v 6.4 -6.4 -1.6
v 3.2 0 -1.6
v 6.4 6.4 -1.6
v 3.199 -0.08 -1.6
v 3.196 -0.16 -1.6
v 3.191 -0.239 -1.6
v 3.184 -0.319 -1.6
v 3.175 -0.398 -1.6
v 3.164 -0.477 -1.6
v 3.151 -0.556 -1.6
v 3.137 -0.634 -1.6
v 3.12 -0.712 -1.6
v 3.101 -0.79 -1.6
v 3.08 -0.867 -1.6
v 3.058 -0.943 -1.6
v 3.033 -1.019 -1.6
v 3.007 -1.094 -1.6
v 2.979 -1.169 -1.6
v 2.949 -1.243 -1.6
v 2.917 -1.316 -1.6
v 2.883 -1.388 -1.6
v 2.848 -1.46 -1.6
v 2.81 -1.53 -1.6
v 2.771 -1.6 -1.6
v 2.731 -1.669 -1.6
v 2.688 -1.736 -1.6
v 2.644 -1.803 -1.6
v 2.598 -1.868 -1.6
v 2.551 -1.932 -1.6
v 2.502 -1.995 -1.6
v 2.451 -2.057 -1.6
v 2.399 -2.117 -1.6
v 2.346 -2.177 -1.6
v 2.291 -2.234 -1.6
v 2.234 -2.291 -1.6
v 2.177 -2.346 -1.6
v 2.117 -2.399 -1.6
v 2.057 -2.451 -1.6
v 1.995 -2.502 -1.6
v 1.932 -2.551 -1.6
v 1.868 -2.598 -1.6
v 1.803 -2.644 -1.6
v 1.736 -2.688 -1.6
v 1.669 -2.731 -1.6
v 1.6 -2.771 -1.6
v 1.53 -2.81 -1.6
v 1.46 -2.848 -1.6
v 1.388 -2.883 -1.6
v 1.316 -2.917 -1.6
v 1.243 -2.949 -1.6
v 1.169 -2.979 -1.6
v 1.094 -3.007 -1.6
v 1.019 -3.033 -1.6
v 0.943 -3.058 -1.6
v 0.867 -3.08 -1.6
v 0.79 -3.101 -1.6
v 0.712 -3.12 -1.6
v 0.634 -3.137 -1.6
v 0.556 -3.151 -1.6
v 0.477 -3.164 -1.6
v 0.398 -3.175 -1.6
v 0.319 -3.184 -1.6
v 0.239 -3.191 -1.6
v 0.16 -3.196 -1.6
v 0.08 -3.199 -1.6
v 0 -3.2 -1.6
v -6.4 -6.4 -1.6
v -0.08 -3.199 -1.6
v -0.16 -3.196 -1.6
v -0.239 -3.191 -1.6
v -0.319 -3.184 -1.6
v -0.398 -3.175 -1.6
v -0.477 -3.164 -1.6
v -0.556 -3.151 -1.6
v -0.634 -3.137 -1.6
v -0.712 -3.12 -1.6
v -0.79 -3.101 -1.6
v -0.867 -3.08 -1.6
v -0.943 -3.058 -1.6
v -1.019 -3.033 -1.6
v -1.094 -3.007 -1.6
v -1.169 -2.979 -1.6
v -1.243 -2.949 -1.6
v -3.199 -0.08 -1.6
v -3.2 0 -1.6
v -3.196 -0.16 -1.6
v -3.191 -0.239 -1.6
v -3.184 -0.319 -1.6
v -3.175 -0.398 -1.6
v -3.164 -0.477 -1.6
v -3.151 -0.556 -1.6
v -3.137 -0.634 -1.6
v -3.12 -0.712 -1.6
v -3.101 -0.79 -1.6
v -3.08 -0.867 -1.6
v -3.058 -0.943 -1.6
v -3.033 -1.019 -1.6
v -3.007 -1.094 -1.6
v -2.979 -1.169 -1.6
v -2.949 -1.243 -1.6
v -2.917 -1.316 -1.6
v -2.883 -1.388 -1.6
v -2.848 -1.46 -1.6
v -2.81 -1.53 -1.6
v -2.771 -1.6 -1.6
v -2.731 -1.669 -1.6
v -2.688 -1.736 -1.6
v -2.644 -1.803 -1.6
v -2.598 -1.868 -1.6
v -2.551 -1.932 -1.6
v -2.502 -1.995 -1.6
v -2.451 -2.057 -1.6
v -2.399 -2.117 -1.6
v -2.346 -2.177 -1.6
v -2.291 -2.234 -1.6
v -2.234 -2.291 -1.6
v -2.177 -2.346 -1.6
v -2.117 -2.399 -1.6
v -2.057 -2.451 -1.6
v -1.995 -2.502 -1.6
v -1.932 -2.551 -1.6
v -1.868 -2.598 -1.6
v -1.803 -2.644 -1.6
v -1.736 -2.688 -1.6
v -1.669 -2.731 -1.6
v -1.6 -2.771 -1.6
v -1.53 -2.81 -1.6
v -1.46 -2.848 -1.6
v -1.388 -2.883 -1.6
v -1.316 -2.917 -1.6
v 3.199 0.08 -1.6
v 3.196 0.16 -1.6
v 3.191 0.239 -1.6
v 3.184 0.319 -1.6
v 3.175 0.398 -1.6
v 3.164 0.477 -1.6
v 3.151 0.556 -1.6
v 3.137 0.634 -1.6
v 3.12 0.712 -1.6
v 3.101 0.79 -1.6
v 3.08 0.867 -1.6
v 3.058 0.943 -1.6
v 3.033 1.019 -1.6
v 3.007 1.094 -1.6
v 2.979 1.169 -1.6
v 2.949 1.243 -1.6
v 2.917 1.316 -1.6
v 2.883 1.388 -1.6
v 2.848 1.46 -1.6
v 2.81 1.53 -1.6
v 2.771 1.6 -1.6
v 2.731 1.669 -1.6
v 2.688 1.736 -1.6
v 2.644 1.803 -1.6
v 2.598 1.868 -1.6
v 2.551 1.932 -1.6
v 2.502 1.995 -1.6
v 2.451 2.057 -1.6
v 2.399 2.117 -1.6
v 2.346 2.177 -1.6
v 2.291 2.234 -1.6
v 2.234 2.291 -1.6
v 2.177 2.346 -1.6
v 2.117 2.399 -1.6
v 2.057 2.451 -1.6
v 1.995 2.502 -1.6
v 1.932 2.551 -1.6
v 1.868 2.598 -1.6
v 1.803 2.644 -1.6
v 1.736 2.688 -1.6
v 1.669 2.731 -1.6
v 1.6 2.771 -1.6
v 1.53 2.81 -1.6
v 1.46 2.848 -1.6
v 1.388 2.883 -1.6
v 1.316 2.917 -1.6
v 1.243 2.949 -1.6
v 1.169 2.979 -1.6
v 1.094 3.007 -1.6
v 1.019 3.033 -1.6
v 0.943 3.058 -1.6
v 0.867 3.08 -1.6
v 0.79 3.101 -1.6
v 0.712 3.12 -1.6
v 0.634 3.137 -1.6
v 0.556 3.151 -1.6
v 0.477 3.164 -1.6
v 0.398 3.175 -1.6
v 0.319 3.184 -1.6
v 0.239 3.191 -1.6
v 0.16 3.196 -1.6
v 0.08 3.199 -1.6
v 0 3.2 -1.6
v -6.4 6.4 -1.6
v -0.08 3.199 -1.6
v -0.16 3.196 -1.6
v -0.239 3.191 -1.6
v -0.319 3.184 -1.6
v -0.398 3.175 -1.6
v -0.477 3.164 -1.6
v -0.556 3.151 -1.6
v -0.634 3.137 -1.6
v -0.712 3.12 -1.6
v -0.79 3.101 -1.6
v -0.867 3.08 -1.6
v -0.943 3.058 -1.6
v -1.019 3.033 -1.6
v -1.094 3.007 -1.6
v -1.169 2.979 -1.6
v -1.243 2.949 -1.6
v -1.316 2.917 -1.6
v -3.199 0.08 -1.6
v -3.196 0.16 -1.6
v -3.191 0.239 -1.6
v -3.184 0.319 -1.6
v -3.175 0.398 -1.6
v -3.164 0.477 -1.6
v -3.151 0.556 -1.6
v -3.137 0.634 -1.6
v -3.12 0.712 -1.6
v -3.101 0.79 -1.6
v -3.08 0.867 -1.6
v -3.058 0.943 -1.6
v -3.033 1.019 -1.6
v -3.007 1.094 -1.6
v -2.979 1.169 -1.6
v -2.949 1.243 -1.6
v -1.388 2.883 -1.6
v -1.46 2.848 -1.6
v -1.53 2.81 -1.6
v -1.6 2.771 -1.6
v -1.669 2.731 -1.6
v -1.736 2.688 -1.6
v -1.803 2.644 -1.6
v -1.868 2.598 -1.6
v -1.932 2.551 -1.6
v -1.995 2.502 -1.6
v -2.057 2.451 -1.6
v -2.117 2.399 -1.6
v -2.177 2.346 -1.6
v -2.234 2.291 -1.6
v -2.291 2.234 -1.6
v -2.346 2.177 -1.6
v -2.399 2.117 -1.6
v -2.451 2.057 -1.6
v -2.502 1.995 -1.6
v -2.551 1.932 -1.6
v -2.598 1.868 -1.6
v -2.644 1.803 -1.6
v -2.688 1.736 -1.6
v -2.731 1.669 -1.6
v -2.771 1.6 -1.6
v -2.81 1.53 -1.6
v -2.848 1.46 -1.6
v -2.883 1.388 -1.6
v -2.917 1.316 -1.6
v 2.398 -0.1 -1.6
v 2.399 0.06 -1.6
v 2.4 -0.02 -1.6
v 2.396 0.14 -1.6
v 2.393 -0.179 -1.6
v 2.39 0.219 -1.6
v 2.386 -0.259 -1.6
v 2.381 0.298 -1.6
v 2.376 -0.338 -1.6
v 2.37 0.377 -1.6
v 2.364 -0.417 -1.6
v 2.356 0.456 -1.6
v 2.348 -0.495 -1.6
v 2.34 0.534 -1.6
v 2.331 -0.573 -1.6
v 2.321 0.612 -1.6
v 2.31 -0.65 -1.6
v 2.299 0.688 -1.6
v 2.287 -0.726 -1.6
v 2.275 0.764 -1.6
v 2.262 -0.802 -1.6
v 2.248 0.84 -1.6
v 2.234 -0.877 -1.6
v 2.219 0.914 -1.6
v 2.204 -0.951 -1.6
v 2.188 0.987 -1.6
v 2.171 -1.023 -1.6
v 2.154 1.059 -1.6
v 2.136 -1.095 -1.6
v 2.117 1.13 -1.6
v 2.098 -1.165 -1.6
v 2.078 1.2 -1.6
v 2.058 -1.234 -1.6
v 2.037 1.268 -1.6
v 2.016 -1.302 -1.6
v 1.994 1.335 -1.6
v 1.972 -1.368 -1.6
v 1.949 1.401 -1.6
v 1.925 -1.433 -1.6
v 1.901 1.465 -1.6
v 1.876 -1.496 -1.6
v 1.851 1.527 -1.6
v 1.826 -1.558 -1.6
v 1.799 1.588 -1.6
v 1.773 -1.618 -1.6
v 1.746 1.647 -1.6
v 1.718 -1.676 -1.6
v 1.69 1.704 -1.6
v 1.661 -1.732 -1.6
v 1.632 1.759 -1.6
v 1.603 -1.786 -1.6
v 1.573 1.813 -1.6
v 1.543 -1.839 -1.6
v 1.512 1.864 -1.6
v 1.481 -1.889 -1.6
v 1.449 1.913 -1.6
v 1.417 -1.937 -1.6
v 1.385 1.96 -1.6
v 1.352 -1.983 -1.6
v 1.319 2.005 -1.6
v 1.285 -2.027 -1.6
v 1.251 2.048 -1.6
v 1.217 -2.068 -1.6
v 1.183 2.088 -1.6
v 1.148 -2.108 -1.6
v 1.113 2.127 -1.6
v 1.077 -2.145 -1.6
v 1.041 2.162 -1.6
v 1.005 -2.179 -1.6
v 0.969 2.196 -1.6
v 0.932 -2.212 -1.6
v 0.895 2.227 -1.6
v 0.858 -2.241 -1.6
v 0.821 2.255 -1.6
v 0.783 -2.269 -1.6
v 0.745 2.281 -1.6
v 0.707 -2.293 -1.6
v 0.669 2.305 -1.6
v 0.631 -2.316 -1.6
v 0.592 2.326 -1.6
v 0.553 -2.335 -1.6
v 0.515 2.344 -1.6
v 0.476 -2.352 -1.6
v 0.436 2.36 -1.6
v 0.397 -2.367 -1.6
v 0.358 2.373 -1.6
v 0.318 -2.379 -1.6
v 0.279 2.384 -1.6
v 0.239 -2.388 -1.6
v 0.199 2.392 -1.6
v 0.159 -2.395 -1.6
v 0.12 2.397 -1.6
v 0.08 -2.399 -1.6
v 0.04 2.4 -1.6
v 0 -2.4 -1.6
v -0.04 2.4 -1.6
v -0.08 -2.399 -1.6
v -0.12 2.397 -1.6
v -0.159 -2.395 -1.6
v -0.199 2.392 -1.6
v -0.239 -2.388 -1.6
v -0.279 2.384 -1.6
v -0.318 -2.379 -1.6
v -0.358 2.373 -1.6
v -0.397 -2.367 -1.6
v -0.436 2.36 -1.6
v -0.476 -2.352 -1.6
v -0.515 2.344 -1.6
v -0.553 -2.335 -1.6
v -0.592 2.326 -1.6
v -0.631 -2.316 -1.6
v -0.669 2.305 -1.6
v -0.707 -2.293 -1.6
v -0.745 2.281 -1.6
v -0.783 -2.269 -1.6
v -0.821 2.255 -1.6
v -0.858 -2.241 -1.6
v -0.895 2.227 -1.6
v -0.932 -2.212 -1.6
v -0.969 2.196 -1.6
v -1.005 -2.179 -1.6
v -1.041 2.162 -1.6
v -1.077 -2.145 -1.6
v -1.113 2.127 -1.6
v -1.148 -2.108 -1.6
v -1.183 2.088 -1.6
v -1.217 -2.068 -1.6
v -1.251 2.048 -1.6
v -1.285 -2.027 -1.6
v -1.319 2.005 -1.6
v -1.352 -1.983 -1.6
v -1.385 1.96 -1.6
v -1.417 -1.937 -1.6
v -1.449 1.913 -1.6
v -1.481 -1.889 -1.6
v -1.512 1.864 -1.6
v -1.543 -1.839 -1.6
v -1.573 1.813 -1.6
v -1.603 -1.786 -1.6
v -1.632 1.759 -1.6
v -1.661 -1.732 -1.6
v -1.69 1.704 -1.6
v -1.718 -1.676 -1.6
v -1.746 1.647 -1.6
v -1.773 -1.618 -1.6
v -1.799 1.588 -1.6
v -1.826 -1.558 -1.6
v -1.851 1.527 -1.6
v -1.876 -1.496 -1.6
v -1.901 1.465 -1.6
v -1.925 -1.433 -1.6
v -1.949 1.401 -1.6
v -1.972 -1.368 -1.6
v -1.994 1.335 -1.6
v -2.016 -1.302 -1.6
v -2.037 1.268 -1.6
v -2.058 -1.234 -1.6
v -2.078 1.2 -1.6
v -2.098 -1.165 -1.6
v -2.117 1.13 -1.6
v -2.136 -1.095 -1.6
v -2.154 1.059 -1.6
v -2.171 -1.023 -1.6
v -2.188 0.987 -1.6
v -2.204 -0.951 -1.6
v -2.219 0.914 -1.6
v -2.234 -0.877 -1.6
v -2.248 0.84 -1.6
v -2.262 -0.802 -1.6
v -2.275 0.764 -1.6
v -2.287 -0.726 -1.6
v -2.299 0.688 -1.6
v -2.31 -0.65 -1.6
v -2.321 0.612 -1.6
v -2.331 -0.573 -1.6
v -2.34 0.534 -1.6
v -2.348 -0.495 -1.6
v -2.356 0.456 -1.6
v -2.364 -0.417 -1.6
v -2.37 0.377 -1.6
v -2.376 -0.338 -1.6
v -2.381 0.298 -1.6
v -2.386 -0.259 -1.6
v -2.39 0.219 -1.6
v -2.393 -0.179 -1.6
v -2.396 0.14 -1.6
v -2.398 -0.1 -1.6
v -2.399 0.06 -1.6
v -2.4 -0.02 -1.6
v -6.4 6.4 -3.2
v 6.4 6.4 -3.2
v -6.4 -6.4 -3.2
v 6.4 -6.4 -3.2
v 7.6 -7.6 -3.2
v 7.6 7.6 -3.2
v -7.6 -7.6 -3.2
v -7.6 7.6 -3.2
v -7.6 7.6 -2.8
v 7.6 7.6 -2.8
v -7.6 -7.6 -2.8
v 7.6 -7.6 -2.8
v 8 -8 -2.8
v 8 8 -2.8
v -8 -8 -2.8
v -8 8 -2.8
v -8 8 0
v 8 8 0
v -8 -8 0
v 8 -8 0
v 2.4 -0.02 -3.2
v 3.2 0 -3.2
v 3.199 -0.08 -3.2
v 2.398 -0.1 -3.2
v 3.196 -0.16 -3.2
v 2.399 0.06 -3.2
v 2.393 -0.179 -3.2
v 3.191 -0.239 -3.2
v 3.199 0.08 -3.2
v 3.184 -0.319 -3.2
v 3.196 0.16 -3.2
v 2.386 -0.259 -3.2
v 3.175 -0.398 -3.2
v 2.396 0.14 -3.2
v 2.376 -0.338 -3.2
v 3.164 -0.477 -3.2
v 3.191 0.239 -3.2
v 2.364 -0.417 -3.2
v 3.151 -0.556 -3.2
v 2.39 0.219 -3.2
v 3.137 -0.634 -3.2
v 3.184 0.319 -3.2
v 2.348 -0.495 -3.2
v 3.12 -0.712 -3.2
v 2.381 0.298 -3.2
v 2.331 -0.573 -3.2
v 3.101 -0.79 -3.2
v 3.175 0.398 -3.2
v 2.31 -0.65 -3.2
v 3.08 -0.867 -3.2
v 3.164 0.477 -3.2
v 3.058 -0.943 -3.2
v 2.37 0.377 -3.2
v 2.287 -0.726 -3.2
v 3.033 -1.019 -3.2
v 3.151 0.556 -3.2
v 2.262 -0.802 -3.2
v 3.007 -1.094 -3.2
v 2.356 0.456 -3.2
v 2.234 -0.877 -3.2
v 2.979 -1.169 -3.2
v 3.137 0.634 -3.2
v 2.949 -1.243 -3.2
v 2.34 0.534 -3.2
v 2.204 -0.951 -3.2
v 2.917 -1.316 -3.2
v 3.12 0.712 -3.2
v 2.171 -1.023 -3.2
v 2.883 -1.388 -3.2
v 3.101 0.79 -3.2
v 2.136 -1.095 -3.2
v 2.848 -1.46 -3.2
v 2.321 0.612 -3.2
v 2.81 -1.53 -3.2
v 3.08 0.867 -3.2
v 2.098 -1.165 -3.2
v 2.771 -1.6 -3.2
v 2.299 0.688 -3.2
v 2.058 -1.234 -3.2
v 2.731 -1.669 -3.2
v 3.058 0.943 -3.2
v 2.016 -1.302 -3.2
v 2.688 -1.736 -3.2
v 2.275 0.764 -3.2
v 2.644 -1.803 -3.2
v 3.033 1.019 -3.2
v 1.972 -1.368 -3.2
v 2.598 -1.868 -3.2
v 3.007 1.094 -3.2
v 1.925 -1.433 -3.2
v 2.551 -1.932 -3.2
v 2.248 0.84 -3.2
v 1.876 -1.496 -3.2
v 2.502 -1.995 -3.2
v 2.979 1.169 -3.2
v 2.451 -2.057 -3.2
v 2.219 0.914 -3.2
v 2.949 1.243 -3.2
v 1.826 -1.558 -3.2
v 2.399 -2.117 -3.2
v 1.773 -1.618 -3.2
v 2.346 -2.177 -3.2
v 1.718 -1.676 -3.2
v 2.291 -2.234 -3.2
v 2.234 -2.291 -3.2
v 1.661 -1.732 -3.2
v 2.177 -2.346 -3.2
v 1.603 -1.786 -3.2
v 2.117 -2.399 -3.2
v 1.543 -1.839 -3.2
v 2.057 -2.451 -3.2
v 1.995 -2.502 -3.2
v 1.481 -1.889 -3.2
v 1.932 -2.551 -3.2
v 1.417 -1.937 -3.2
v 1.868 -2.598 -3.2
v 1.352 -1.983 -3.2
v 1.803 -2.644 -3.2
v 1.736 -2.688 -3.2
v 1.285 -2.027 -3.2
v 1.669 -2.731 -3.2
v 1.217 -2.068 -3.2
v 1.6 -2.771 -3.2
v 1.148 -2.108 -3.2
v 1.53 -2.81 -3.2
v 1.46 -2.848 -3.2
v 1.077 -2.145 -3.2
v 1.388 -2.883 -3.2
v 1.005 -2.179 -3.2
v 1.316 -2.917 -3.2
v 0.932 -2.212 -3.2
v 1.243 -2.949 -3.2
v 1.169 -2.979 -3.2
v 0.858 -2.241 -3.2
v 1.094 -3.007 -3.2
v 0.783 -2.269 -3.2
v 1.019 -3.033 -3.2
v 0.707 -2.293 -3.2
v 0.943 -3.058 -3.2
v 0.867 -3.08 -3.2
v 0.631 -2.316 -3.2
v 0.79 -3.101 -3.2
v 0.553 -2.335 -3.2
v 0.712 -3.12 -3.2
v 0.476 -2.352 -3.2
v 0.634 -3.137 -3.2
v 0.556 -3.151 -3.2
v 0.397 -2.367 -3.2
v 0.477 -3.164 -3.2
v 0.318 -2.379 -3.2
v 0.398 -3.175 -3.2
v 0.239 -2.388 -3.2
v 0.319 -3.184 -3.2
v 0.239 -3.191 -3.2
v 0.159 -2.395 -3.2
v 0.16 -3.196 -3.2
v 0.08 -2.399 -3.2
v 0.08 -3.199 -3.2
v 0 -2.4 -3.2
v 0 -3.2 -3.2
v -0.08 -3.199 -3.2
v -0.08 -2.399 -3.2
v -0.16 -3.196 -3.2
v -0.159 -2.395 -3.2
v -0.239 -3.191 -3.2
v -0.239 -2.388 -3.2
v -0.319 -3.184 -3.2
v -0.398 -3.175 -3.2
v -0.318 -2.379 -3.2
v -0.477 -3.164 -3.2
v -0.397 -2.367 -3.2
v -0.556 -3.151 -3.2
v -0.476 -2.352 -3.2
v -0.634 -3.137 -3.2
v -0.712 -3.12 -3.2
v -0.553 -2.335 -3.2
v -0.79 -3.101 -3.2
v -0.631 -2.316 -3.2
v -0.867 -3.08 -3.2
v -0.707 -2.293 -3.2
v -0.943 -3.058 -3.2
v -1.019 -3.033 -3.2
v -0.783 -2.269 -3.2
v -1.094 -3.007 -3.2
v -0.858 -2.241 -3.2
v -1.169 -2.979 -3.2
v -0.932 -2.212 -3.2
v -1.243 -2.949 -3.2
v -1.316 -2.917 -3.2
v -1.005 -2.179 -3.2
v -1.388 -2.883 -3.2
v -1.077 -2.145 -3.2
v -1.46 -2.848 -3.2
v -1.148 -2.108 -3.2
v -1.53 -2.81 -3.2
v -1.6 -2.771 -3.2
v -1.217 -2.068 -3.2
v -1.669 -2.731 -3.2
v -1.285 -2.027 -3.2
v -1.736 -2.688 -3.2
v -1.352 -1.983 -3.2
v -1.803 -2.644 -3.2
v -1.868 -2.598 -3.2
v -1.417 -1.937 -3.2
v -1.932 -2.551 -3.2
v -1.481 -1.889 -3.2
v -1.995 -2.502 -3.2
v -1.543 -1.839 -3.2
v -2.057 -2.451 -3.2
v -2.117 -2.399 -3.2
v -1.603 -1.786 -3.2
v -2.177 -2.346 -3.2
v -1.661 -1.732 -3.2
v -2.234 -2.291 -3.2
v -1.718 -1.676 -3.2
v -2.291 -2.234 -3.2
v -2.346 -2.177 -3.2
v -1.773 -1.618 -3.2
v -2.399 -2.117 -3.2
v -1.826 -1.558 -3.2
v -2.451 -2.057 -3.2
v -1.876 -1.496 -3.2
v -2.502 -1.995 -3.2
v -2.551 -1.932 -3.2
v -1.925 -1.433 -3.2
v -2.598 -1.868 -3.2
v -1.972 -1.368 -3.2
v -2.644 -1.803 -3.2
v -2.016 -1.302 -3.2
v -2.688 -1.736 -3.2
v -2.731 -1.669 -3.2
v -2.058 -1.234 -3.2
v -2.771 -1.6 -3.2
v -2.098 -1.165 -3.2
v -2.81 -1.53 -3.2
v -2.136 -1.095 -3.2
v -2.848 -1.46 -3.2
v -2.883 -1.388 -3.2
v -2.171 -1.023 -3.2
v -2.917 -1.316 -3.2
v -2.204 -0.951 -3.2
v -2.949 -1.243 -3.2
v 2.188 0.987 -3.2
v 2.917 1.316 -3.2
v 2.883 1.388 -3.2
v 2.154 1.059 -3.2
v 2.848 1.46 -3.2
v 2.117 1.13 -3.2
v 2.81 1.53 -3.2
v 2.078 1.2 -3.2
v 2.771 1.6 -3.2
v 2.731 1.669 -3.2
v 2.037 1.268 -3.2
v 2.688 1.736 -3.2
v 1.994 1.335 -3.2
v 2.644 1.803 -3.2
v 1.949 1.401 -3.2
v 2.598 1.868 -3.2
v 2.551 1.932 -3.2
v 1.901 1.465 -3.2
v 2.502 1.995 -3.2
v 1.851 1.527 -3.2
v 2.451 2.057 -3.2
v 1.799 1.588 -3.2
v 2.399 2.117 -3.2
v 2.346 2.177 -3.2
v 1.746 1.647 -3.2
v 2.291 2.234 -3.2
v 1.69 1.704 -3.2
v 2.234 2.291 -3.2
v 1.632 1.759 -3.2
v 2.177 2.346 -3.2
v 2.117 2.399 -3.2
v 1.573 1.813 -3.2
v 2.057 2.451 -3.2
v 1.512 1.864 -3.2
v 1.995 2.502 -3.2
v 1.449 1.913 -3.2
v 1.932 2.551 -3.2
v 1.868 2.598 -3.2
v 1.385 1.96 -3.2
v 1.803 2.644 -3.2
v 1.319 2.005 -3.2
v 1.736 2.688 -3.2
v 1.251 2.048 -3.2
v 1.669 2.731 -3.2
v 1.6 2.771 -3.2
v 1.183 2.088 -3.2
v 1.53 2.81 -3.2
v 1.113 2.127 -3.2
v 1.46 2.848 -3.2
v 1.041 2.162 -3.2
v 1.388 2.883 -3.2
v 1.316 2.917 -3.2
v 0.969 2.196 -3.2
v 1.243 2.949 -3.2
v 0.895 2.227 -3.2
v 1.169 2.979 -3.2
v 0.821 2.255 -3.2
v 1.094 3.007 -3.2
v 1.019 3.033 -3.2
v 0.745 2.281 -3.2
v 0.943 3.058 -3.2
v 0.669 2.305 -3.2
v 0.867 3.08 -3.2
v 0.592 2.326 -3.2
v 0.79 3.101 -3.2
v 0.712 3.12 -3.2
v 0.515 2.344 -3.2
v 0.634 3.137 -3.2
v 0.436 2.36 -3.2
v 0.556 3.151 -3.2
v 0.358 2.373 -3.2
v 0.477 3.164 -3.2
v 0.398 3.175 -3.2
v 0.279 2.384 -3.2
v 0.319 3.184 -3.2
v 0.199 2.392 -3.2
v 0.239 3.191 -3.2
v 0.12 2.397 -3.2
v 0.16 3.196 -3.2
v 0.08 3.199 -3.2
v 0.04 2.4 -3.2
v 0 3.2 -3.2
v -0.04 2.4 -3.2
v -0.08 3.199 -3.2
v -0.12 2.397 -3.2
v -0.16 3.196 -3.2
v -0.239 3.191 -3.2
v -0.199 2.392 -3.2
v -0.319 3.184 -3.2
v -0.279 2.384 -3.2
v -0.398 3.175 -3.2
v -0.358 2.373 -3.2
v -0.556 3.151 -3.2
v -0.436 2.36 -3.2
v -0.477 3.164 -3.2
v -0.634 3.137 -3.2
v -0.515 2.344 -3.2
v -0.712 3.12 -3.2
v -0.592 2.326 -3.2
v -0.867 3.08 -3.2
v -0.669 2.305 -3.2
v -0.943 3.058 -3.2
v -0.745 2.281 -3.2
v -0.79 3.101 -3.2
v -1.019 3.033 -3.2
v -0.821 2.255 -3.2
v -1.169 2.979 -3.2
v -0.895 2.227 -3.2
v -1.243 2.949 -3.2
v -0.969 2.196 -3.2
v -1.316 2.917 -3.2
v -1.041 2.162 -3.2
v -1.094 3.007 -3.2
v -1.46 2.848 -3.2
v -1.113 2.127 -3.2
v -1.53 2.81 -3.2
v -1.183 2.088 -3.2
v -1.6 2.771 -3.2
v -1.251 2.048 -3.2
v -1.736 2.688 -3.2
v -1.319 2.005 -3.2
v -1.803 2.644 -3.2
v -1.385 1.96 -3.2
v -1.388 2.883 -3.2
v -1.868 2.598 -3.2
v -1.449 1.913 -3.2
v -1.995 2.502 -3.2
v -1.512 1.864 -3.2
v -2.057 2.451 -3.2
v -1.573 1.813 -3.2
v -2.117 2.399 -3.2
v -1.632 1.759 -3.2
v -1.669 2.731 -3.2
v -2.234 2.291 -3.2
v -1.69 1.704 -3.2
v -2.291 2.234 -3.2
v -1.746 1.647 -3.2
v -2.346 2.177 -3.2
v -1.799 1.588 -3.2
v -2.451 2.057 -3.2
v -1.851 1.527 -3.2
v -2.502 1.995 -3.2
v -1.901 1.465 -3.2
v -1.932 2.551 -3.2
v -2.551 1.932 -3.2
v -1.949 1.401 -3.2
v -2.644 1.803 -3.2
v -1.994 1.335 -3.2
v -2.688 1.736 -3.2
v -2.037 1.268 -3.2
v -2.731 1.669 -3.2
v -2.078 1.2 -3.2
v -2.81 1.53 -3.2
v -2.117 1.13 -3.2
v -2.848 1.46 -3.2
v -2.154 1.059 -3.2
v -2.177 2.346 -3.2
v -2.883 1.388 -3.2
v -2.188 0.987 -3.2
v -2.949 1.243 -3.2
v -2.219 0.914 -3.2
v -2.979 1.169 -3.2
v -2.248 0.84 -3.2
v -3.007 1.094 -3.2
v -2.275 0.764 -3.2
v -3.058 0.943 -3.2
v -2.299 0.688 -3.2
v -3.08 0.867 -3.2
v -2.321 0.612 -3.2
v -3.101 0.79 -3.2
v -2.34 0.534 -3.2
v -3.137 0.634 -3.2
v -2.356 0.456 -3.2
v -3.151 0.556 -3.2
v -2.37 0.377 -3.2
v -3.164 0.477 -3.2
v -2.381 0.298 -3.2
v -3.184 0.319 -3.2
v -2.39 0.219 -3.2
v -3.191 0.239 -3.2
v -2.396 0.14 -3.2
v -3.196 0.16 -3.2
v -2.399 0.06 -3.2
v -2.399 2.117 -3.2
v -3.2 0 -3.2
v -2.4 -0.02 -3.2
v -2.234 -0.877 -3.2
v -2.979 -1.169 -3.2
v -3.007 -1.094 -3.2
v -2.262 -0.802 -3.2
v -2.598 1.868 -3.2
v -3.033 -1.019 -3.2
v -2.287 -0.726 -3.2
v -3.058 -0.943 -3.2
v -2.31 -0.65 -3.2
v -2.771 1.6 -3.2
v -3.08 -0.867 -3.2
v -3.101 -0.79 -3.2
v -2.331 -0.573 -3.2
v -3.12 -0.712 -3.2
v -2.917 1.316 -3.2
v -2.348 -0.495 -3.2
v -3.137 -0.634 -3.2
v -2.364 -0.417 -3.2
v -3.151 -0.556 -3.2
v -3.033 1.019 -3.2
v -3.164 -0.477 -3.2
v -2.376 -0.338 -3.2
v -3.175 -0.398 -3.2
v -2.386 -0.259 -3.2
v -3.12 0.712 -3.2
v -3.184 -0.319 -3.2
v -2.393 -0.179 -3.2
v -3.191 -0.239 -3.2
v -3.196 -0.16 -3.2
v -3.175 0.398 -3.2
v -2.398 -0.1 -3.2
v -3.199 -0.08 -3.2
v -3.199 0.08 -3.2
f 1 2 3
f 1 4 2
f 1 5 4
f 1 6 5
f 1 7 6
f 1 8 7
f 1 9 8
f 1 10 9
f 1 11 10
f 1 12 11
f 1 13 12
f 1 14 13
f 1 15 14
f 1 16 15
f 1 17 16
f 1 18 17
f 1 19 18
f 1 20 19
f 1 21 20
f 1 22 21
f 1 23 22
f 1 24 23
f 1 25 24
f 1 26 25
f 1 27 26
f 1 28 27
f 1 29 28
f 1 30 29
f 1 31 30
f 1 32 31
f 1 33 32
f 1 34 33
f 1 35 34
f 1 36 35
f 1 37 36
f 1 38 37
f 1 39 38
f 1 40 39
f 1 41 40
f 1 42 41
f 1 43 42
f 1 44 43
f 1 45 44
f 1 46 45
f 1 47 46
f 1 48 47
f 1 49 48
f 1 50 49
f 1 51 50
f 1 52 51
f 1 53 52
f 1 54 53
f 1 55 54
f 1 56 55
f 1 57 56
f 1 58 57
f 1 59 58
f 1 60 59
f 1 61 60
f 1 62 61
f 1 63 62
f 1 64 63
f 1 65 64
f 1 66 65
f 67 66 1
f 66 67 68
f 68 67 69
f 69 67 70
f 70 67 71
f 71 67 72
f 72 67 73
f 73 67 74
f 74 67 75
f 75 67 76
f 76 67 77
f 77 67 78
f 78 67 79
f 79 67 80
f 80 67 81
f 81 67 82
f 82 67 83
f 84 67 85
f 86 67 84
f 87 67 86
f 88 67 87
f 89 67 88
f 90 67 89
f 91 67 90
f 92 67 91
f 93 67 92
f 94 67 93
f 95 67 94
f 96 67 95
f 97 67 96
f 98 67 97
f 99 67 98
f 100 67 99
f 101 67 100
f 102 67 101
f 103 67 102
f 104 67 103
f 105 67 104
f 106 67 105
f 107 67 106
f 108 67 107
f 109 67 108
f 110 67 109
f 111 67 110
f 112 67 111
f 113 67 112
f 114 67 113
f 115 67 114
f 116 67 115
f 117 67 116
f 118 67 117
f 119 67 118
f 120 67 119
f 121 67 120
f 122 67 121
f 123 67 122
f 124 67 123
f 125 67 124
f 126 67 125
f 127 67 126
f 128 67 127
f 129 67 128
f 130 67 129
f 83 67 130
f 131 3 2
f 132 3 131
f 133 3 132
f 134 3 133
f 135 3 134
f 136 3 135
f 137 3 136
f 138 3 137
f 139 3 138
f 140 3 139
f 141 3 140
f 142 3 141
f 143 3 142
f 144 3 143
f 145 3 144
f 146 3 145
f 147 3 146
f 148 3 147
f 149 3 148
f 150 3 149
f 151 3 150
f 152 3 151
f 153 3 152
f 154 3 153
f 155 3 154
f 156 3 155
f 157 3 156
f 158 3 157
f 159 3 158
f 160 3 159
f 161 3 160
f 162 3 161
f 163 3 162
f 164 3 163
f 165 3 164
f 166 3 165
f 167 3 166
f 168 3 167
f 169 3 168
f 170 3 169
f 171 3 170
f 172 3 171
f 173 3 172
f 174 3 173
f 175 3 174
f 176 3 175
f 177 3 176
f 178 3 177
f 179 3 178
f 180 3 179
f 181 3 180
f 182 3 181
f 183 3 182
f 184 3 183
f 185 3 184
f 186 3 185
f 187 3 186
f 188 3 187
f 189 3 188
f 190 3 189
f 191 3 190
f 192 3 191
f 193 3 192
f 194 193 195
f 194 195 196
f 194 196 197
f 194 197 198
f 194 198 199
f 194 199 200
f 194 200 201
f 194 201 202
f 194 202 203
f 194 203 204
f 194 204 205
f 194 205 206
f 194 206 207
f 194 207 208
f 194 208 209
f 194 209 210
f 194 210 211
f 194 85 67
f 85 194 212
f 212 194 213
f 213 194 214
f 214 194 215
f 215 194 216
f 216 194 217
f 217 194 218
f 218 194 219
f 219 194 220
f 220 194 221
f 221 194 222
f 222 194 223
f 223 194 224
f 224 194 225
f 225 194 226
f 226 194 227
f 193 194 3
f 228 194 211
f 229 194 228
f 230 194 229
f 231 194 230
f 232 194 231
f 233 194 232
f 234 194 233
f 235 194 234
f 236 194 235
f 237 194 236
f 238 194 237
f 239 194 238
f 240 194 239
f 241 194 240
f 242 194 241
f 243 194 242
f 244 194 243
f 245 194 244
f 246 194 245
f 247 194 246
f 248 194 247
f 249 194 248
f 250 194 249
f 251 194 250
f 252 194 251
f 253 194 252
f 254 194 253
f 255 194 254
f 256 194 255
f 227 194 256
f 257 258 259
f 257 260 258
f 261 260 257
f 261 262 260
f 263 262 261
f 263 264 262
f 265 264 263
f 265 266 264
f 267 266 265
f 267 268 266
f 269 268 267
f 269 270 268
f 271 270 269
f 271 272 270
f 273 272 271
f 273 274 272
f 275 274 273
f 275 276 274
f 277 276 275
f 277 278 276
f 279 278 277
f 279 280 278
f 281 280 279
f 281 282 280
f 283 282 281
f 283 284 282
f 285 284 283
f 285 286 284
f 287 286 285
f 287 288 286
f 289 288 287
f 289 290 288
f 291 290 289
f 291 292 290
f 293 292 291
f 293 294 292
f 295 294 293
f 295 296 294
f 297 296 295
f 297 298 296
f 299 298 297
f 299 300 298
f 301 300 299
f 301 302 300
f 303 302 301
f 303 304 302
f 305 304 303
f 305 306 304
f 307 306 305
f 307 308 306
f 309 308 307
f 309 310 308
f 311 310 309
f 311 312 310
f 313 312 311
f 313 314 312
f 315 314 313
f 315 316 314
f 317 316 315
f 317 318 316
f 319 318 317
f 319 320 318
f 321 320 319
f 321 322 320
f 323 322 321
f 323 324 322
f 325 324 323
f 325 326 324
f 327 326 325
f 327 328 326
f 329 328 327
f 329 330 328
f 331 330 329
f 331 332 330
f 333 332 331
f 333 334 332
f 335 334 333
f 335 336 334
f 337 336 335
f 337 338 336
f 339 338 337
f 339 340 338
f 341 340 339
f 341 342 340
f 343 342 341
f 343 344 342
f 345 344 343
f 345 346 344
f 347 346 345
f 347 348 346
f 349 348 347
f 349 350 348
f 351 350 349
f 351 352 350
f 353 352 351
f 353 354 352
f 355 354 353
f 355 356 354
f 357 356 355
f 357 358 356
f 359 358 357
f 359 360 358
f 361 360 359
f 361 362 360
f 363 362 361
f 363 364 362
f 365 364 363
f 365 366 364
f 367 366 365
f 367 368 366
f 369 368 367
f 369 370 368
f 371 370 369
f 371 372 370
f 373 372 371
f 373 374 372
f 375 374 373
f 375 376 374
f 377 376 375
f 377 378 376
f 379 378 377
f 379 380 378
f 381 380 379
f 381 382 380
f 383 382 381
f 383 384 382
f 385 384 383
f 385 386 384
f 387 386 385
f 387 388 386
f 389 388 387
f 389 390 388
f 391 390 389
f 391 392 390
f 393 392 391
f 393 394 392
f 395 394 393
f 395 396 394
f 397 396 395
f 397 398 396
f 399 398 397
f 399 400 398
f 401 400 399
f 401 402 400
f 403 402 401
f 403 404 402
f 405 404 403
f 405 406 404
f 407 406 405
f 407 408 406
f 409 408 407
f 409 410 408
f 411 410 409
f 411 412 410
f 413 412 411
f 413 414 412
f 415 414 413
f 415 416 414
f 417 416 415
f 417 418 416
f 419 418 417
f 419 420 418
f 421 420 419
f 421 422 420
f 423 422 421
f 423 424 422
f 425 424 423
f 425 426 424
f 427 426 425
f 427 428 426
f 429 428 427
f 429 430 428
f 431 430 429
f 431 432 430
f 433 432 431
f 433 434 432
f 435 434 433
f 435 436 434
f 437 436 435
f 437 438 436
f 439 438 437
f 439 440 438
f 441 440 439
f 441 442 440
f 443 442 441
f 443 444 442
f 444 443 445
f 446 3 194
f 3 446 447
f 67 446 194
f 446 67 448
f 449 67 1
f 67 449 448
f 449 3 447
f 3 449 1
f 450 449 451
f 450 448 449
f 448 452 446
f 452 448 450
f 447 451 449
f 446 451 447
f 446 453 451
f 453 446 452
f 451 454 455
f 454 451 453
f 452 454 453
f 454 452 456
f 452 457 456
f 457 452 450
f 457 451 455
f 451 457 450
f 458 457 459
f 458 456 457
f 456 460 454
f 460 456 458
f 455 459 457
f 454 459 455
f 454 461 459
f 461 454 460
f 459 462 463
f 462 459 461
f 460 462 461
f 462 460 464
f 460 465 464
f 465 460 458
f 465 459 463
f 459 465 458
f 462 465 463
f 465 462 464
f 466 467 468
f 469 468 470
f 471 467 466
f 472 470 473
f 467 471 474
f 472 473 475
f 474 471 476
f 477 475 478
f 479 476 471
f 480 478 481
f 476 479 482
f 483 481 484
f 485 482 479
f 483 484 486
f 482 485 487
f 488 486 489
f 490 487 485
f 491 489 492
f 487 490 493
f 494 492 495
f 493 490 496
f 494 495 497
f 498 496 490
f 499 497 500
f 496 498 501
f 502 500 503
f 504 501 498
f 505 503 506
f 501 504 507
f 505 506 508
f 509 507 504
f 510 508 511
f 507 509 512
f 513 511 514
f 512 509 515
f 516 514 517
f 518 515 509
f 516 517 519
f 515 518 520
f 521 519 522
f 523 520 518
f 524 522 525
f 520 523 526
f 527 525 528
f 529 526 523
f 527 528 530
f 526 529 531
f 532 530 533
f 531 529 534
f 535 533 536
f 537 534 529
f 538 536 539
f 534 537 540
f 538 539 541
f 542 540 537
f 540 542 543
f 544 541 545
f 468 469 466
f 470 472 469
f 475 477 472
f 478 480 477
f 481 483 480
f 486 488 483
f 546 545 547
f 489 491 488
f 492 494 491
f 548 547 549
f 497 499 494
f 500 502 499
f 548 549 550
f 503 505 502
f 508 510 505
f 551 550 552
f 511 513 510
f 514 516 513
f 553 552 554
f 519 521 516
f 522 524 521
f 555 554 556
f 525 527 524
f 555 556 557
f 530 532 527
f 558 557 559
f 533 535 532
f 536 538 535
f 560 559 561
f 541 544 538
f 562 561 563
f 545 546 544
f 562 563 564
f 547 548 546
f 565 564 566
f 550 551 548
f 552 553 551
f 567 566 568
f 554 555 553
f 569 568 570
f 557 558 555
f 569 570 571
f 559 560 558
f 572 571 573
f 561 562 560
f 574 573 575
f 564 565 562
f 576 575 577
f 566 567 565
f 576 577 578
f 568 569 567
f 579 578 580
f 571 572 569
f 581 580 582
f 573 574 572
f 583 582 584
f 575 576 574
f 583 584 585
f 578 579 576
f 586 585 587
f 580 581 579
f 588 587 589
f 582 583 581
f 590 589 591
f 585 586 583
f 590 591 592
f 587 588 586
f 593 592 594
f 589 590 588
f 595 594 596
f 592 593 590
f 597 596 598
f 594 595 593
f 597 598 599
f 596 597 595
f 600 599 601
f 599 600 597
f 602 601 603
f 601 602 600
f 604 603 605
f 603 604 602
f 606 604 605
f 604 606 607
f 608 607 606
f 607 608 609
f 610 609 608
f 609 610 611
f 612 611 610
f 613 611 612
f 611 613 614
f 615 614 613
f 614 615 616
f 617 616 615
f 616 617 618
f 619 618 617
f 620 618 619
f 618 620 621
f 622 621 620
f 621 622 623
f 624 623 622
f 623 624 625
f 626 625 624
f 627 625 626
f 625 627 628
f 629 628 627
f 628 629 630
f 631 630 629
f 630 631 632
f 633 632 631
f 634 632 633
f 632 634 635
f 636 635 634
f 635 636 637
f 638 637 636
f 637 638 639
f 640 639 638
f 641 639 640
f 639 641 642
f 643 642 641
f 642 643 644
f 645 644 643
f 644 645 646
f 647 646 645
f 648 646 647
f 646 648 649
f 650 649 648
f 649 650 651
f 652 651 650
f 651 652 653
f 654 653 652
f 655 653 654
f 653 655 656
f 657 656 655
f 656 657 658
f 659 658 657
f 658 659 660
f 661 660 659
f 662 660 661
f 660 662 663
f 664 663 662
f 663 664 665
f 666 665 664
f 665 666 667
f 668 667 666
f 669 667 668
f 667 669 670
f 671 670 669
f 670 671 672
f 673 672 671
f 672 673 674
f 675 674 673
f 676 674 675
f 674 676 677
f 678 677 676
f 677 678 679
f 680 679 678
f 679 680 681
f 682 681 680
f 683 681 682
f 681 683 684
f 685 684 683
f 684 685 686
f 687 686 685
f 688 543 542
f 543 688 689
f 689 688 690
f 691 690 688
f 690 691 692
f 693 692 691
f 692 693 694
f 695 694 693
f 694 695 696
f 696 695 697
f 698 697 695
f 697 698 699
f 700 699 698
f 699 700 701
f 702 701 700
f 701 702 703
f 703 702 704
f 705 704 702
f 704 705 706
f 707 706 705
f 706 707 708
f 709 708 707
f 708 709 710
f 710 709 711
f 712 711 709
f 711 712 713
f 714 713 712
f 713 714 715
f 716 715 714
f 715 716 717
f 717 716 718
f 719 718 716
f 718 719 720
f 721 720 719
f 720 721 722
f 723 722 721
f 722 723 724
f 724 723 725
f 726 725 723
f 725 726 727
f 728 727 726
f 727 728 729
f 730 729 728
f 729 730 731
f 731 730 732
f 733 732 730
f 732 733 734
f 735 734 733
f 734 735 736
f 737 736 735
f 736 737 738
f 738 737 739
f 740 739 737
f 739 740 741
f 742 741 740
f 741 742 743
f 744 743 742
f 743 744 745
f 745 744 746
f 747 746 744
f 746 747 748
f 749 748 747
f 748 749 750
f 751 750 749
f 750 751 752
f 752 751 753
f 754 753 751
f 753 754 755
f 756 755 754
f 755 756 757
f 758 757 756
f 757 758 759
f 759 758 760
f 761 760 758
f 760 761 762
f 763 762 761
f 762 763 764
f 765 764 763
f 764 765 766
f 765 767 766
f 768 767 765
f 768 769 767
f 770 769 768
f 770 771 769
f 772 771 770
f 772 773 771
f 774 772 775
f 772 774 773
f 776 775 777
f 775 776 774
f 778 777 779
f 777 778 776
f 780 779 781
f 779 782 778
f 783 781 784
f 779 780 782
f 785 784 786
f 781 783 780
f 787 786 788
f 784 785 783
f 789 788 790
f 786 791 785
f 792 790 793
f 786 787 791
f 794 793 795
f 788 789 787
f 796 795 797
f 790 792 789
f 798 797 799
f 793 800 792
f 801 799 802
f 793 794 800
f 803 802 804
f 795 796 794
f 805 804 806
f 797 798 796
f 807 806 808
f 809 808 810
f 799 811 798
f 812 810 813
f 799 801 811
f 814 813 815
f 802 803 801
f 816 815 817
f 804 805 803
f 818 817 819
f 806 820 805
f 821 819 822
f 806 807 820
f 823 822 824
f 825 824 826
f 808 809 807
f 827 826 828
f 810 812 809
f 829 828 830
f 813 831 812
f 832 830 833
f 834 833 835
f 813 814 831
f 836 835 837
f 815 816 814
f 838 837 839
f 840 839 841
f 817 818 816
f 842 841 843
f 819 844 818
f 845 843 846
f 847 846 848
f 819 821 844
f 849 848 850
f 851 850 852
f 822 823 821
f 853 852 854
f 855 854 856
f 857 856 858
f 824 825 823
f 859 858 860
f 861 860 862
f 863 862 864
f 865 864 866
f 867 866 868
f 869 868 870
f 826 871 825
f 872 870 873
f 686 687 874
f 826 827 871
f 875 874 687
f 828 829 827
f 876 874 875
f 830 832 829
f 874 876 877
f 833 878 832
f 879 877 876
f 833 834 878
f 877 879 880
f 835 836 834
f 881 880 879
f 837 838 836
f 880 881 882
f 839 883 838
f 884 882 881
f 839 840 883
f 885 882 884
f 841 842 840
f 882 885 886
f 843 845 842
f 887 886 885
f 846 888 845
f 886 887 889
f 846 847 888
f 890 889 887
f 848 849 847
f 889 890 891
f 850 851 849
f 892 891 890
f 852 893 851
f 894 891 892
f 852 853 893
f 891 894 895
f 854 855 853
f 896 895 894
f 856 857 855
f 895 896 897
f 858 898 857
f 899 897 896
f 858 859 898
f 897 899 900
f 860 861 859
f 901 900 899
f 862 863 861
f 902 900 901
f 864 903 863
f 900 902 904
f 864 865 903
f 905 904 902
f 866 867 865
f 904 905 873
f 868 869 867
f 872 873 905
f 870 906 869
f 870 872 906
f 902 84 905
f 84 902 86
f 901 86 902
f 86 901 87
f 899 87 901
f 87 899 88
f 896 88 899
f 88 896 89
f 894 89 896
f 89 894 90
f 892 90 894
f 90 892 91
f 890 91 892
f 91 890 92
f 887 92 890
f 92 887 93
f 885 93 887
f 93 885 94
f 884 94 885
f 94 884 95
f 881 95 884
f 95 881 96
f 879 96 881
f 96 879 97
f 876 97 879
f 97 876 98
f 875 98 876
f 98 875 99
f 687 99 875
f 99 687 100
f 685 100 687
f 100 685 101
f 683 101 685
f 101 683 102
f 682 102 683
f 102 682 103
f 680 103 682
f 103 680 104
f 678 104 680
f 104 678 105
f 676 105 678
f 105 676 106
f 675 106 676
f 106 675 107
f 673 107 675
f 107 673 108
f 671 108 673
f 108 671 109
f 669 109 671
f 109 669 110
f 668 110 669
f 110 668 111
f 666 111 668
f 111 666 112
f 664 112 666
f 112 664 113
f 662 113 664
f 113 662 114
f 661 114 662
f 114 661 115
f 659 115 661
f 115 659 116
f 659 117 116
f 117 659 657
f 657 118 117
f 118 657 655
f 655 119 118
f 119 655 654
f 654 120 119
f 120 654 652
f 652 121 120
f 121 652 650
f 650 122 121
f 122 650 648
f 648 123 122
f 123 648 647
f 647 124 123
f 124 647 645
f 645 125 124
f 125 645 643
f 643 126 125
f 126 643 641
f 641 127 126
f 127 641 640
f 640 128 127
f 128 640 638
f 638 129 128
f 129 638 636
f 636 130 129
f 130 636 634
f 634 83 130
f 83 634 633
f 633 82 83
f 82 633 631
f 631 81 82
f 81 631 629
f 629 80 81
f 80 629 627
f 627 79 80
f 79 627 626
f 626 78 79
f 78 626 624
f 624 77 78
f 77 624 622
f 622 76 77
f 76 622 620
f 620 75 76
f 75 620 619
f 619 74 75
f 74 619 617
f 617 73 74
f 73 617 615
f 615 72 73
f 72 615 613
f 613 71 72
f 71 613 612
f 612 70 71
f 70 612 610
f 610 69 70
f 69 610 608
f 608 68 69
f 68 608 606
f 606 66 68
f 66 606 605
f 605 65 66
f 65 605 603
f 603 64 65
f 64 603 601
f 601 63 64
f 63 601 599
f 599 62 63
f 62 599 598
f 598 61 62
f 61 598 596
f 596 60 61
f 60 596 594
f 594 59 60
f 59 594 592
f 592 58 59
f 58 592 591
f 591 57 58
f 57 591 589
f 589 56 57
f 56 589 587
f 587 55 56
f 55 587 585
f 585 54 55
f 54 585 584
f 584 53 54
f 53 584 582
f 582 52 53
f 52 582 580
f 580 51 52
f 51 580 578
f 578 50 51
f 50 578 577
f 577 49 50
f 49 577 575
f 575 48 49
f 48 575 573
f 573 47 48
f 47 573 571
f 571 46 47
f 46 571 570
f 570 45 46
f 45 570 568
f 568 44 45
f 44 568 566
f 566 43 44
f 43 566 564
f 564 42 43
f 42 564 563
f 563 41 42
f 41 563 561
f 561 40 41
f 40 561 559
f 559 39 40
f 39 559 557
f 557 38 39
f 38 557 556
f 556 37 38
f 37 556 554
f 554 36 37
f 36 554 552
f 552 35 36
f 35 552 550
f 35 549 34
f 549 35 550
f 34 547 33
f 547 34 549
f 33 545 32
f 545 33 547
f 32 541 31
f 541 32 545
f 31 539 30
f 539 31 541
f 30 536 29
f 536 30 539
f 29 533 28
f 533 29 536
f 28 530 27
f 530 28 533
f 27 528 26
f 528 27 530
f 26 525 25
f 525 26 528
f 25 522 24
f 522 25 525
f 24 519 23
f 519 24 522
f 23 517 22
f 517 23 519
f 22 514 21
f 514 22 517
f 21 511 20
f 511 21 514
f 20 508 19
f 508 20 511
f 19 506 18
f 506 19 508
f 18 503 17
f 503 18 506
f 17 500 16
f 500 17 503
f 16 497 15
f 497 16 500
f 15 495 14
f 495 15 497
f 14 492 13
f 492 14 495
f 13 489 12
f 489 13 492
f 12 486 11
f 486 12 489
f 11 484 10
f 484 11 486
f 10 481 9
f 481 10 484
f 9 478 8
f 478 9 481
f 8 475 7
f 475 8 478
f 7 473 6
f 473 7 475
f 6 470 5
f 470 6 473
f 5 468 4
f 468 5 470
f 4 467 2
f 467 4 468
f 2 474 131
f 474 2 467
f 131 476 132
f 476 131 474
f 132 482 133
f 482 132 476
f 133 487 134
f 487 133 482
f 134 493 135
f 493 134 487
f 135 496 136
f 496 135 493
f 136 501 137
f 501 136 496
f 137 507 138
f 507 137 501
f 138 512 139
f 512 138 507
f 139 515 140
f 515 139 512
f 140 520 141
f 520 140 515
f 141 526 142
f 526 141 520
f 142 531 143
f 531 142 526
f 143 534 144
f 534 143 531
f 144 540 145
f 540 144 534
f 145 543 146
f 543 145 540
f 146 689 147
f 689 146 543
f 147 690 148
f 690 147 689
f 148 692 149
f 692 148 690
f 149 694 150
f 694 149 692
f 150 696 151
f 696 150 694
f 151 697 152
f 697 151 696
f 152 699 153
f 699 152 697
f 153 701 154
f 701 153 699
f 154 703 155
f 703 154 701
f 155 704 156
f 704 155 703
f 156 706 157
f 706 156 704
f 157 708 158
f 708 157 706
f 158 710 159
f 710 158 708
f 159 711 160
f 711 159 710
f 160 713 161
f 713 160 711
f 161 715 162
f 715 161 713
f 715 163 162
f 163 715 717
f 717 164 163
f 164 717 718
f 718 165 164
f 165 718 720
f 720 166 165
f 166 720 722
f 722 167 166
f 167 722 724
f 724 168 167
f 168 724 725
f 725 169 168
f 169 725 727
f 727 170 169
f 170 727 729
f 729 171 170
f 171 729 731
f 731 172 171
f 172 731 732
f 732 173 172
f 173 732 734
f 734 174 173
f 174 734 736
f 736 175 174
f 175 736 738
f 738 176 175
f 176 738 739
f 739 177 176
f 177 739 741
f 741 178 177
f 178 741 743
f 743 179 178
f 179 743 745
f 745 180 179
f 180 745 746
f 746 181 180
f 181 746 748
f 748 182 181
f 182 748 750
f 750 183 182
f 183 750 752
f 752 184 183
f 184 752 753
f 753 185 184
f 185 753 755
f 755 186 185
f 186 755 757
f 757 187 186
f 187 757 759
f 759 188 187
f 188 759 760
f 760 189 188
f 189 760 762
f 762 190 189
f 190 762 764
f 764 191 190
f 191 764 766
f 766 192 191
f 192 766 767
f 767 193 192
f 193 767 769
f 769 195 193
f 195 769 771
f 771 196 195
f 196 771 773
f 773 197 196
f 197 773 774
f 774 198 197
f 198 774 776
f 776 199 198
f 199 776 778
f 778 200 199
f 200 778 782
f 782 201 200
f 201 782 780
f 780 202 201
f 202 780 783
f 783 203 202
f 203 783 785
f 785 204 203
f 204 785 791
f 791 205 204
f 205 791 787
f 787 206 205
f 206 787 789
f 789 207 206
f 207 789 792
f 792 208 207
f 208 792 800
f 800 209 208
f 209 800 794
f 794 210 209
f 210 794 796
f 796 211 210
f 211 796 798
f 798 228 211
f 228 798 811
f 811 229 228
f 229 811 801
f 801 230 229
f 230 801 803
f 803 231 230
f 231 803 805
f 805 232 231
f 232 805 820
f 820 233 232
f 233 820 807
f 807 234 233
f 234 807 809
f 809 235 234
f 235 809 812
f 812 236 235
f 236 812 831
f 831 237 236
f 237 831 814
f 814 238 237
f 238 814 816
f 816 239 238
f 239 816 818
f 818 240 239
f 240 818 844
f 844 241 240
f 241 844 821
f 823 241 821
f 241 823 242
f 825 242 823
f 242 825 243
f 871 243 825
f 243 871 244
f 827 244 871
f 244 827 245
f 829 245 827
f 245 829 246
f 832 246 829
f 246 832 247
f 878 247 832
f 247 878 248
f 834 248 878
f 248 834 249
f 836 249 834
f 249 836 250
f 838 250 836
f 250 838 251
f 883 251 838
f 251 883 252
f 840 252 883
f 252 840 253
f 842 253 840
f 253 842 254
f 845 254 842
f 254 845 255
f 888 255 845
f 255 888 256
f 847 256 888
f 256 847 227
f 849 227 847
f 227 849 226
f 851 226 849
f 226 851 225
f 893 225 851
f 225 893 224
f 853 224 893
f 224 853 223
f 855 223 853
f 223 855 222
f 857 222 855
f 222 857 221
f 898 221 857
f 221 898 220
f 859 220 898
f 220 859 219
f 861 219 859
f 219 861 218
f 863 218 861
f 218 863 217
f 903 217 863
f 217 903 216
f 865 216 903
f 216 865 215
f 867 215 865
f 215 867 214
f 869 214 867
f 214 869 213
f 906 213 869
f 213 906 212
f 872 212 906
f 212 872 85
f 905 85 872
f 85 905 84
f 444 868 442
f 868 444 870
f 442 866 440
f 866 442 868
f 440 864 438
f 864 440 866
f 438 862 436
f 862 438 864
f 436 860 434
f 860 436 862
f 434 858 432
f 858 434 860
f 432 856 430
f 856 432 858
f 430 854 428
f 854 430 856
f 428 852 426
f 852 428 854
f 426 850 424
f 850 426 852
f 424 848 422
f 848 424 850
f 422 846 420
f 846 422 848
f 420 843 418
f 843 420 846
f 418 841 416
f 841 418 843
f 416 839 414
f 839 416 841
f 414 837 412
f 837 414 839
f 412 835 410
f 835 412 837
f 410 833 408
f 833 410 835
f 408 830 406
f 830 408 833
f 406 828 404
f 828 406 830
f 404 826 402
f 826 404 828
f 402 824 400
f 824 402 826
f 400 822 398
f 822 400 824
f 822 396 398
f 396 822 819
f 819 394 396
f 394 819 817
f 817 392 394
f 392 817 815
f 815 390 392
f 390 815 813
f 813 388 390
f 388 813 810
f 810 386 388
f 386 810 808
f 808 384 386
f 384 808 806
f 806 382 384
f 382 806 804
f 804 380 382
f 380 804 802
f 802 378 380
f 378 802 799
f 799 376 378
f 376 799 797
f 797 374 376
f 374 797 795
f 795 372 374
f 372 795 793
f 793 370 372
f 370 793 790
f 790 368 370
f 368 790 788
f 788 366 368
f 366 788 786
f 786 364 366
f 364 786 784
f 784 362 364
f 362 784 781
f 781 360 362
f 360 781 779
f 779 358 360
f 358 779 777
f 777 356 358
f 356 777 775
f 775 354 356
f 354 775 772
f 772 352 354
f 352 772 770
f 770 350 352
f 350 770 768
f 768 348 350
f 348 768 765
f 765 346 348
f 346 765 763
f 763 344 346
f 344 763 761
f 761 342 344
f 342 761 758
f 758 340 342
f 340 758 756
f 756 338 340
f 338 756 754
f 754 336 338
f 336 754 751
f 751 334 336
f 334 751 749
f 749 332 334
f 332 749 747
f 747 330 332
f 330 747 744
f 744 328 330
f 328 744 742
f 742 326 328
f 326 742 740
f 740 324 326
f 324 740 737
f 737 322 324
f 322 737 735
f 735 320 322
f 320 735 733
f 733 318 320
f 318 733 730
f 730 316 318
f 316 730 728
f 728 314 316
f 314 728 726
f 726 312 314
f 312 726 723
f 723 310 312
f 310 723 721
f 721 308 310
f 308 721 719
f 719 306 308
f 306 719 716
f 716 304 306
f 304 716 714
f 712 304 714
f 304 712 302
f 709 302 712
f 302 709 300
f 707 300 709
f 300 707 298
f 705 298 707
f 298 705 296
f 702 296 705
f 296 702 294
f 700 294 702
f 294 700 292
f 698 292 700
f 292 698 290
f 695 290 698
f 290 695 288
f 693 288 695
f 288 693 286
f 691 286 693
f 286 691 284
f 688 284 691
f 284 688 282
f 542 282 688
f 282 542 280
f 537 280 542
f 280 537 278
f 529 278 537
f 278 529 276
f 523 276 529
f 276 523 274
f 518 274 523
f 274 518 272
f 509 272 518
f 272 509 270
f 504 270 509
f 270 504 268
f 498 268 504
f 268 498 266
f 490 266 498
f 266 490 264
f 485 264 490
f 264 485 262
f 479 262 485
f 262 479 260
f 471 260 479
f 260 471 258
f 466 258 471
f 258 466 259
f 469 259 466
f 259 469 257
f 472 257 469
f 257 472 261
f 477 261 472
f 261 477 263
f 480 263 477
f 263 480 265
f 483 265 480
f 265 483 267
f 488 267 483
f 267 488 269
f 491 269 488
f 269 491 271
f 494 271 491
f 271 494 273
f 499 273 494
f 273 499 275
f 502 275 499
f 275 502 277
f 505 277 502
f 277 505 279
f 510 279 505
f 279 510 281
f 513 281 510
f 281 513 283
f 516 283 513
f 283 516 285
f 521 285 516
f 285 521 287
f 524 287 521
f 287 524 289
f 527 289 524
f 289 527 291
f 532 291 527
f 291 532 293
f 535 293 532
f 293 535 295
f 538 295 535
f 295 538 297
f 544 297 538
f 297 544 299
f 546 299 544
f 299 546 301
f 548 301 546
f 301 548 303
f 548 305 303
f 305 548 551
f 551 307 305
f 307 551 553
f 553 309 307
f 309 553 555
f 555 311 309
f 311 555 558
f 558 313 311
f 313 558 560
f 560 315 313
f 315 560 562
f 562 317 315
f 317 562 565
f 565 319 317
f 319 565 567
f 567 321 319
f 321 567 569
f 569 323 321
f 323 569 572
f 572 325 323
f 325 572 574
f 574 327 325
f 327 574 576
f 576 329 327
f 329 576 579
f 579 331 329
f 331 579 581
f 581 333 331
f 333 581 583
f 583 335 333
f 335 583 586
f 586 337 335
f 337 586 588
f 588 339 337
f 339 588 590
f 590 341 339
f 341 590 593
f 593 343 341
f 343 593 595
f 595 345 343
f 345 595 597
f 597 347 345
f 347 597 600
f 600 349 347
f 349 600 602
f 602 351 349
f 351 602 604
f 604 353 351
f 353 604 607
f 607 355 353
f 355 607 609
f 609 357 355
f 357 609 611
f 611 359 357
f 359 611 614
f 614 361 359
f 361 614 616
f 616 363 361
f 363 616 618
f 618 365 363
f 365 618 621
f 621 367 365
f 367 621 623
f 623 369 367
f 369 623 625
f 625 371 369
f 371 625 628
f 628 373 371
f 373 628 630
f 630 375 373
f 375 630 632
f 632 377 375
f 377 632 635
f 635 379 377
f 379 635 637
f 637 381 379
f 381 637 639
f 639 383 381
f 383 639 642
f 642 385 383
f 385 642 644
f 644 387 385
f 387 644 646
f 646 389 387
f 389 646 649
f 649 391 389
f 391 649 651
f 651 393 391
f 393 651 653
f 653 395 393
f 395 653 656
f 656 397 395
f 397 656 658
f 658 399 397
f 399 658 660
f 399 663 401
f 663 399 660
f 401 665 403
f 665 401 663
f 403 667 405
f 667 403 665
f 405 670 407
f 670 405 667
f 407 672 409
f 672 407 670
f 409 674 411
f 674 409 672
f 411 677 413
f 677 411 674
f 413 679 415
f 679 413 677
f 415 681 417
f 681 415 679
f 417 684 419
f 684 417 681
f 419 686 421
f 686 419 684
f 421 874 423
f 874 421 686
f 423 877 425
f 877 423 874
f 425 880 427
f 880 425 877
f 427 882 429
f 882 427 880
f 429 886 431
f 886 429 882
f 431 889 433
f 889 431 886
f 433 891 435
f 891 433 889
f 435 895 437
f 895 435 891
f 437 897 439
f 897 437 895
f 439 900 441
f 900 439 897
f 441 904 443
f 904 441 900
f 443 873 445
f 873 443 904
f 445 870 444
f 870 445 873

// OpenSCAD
use <../lib.scad>
use <s/2431pt4s01.scad>
use <s/2431pt4s02.scad>
use <s/3068bs01.scad>
$fa=1; $fs=0.2;
function ldraw_lib__3068bpt6(realsolid=false) = [
// 0 Tile  2 x  2 with Silver "CATERHAM" Pattern
// 0 Name: 3068bpt6.dat
// 0 Author: Ulrich Röder [UR]
// 0 !LDRAW_ORG Part UPDATE 2020-02
// 0 !LICENSE Licensed under CC BY 2.0 and CC BY 4.0 : see CAreadme.txt
// 
// 0 BFC CERTIFY CCW
  [0,"BFC","CERTIFY"],
  [0,"BFC","CCW"],
// 
// 0 !KEYWORDS Bricklink 3068bpb1021, Car, Caterham, Cuusoo, Ideas, Set 21307
// 
// 0 !CMDLINE -c14
// 
// 0 !HISTORY 2020-09-05 [PTadmin] Official Update 2020-02
// 
// 
// 0 // Main
// 1 16 0 0 0 1 0 0 0 1 0 0 0 1 s\3068bs01.dat
  [1,16,0,0,0,1,0,0,0,1,0,0,0,1, ldraw_lib__s__3068bs01(realsolid)],
// 1 16 0 0 14 .5 0 0 0 1 0 0 0 .5 s\2431pt4s02.dat
  [1,16,0,0,14,.5,0,0,0,1,0,0,0,.5, ldraw_lib__s__2431pt4s02(realsolid)],
// 4 16 19 0 16 19 0 12 20 0 -20 20 0 20
  [4,16,19,0,16,19,0,12,20,0,-20,20,0,20],
// 3 16 19 0 12 10 0 12 20 0 -20
  [3,16,19,0,12,10,0,12,20,0,-20],
// 4 16 0 0 12 -20 0 -20 20 0 -20 10 0 12
  [4,16,0,0,12,-20,0,-20,20,0,-20,10,0,12],
// 3 16 -11 0 12 -19 0 12 -20 0 -20
  [3,16,-11,0,12,-19,0,12,-20,0,-20],
// 3 16 -20 0 -20 0 0 12 -11 0 12
  [3,16,-20,0,-20,0,0,12,-11,0,12],
// 3 16 10 0 16 19 0 16 20 0 20
  [3,16,10,0,16,19,0,16,20,0,20],
// 3 16 10 0 16 20 0 20 0 0 16
  [3,16,10,0,16,20,0,20,0,0,16],
// 3 16 -10 0 16 -20 0 20 -19 0 16
  [3,16,-10,0,16,-20,0,20,-19,0,16],
// 4 16 -19 0 16 -20 0 20 -20 0 -20 -19 0 12
  [4,16,-19,0,16,-20,0,20,-20,0,-20,-19,0,12],
// 4 16 -10 0 16 0 0 16 20 0 20 -20 0 20
  [4,16,-10,0,16,0,0,16,20,0,20,-20,0,20],
// 
// 0 // Metallic Silver
// 1 80 0 0 14 .5 0 0 0 1 0 0 0 .5 s\2431pt4s01.dat
  [1,80,0,0,14,.5,0,0,0,1,0,0,0,.5, ldraw_lib__s__2431pt4s01(realsolid)],
];
module ldraw_lib__3068bpt6(step=0, col=false, unit=2/5, alt=false, line=0.2, solid=!$preview)
    makepoly(ldraw_lib__3068bpt6(solid), step=step, col=col, unit=unit, alt=alt, line=line, solid=solid);
ldraw_lib__3068bpt6(line=0.2);
